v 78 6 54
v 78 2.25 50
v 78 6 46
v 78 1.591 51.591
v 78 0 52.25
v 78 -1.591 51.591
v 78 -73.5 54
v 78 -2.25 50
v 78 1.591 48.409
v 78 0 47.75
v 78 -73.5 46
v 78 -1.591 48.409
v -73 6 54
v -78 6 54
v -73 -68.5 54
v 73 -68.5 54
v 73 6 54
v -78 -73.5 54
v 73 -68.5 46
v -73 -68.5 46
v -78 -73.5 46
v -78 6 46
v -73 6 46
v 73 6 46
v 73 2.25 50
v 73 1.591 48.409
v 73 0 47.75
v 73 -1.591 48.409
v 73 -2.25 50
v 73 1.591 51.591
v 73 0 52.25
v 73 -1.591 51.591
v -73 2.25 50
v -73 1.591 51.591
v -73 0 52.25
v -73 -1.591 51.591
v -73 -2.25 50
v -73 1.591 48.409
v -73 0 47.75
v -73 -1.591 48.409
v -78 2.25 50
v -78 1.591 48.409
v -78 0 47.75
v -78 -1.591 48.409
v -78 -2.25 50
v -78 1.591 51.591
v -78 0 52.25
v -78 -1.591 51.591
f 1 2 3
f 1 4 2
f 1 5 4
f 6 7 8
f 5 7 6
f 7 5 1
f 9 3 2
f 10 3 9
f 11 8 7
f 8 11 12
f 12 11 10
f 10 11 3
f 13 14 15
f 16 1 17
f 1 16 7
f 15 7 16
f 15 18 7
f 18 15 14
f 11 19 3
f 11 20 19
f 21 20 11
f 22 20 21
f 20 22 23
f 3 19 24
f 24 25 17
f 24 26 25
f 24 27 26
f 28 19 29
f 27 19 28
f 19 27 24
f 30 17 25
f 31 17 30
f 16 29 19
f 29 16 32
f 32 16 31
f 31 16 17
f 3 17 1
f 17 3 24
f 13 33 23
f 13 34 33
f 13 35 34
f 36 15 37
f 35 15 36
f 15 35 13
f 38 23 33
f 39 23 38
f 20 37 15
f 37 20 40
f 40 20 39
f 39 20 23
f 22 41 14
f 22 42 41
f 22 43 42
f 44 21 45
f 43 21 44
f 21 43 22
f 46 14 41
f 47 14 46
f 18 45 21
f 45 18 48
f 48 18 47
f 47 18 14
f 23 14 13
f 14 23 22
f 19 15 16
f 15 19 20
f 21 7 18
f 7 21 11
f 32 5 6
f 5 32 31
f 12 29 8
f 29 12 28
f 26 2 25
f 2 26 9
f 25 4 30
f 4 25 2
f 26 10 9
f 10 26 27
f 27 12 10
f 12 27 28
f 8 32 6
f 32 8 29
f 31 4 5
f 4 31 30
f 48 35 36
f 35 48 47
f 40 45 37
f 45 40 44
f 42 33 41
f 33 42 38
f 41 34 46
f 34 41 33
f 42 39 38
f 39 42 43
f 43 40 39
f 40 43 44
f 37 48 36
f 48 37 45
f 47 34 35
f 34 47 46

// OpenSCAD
// file: faceplate.scad
// Removable Faceplate for 120mm Noctua Fan Housing
// Secured with 4x M2 screws + M2 nuts (nuts sit in hex pockets in the housing)
// Units: mm
// Matches fan_housing.scad

/* [Parameters – keep in sync with housing] */
outer_width = 140;          // MUST match fan_housing.scad
faceplate_thickness = 2.8;
fan_size = 120;
grille_margin = 8;              // how much solid border around the grille
faceplate_screw_offset = 66;    // MUST match housing (cardinal points now)
m2_clearance_d = 2.2;           // clearance hole for M2 screw
use_countersink = true;
countersink_d = 4.2;
countersink_depth = 1.2;

$fn = 64;

module faceplate() {
    difference() {
        // Outer plate – slightly smaller than housing for flush look, or match for flush
        hull() {
            for (x = [-1,1])
                for (y = [-1,1])
                    translate([x*(outer_width/2 - 4), y*(outer_width/2 - 4), 0])
                        cylinder(d=8, h=faceplate_thickness);
        }
        
        // Main airflow opening (slightly smaller than fan for safety)
        translate([0,0,-1])
            cylinder(d=fan_size - 6, h=faceplate_thickness + 2);
        
        // Protective but high-airflow grille: outer ring + 3 concentric rings + 6 spokes
        // Outer safety ring
        difference() {
            cylinder(d=fan_size - 4, h=faceplate_thickness + 1);
            cylinder(d=fan_size - 10, h=faceplate_thickness + 2);
        }
        // Inner rings
        for (r = [22, 38, 52]) {
            difference() {
                cylinder(d=r*2 + 2.5, h=faceplate_thickness + 1);
                cylinder(d=r*2 - 2.5, h=faceplate_thickness + 2);
            }
        }
        // Spokes
        for (a = [0 : 30 : 150]) {
            rotate([0,0,a])
                translate([0, 0, faceplate_thickness/2])
                    cube([fan_size - 12, 1.8, faceplate_thickness + 1], center=true);
        }
        
        // M2 clearance holes (cardinal points - must match housing)
        for (a = [0, 90, 180, 270]) {
            rotate([0,0,a])
                translate([faceplate_screw_offset, 0, -0.1]) {
                    cylinder(d=m2_clearance_d, h=faceplate_thickness + 1);
                    if (use_countersink)
                        translate([0,0,faceplate_thickness - countersink_depth])
                            cylinder(d1=m2_clearance_d, d2=countersink_d, h=countersink_depth + 0.1);
                }
        }
    }
}

faceplate();
// file: bail.scad
// U-Bail Bracket for the table fan - side-pivot hanging/prop stand.
// Prints flat on the bed (X-Y plane), no supports. Drill the 4.5mm pivot
// holes after printing if they don't come out clean.
//
// Assembly: M4 screw through each arm into the heat-set insert in the
// housing's pivot pad. Friction pivot - tighten to taste (truck vibration).
//   - Folded: arms point down, bar nests in the groove under the base.
//   - Prop: insert an M3 screw (from your kit) in each stop-pin hole, swing
//     the bail back until the arms rest on the pins (~30 deg).
//   - Hang: pull the stop pins, swing the bail up ~100 deg, hook the bar
//     over a wall hook. The fan dangles below on the two M4 pivots.
//
// Arm centers at X=±75.5 (ride on the 3mm pivot pads); pivot holes at local
// Y=0 align with the housing pivots at (Y=0, Z=50).

bail_arm_x = 75.5;   // arm centerline |X|
bail_arm_t = 5;      // arm thickness (X)
bail_arm_w = 8;      // arm width (Z)
bail_arm_l = 71;     // pivot center to bar center
bail_bar_y = -73.5;  // bar bottom edge (nests in base groove)
bail_z0 = 46;        // arm/bar front face (Z)

module bail() {
    difference() {
        union() {
            // arms (pivot hole 6mm below the top end)
            for (sx = [1, -1])
                translate([sx*bail_arm_x - bail_arm_t/2, -bail_arm_l, bail_z0])
                    cube([bail_arm_t, bail_arm_l + 6, bail_arm_w]);
            // bottom bar joining the arms
            translate([-bail_arm_x - bail_arm_t/2, bail_bar_y, bail_z0])
                cube([2*bail_arm_x + bail_arm_t, 5, bail_arm_w]);
        }
        // pivot holes (M4 clearance)
        for (sx = [1, -1])
            translate([sx*bail_arm_x - 3, 0, 50])
                rotate([0,90,0]) cylinder(d=4.5, h=6);
    }
}

// ---------- Render ----------
bail();
// main file
// Geometry checks, run by tools/check_geometry.py. Each `check` value
// renders one solid; the script exports it and measures its volume.
//   clear  : must be empty (an interference, or an opening that is blocked)
//   touch  : must NOT be empty (a contact that has to exist)
//   inside : must be empty (material that should surround a hole is missing)
// The script also renders every printable part to confirm it is manifold.

include <bail.scad>
bail_part = "none";
use <faceplate.scad>

check = "";

blade_d = 116;                  // the fan's blade disc

module front_faceplate() { mirror([0, 0, 1]) faceplate(); }

// Everything the bail must clear while it swings.
module bail_obstacles() {
    head();
    rounded_box_z(outer_width, outer_width, -2.8, 0, corner_r);                // the front faceplate
    rounded_box_y(outer_width, base_depth, base_bottom, head_y0, corner_r);    // base + plate
    oled_pod();
    zero_collar();
    translate([outer_width/2, pot_y, pot_z]) rotate([0, 90, 0]) cylinder(d=22, h=18);   // knob
}

module board_keepouts() {
    bms_keepout(); charger_keepout(); carrier_pcb_keepout();
    pot_keepout(); usb_socket_keepout(); button_keepout();
    rear_screws_keepout();
}

// Material that must surround each insert pilot (1.2-1.5 mm walls).
module head_pilot_rings() {
    // the bail's pivots, from the recess floor into the top columns
    for (sx = [-1, 1])
        translate([sx*(duct_x - 0.2), pivot_y, pivot_z]) rotate([0, -sx*90, 0])
            difference() { cylinder(d=m4_insert_d + 3, h=m4_insert_depth - 0.2); cylinder(d=m4_insert_d, h=20, center=true); }
    // the front faceplate's
    for (a = [0, 90, 180, 270])
        rotate([0, 0, a]) translate([faceplate_screw_offset, 0, 0.2])
            difference() { cylinder(d=m2_insert_d + 2.4, h=m2_insert_depth - 0.2); cylinder(d=m2_insert_d, h=20, center=true); }
    // the fan's, in the columns' front faces
    for (sx = [-1, 1], sy = [-1, 1])
        translate([sx*mount_spacing/2, sy*mount_spacing/2, fan_z0 + fan_thickness + 0.2])
            difference() { cylinder(d=m3_insert_d + 3, h=m3_insert_depth - 0.2); cylinder(d=m3_insert_d, h=20, center=true); }
    // the rear head-to-base screws', up into the bottom columns
    for (p = rear_join_pts)
        translate([p[0], 0, p[1]]) difference() { y_cyl(m3_insert_d + 3, head_y0 + 0.2, m3_insert_depth - 0.2); y_cyl(m3_insert_d, head_y0 - 1, 20); }
}
module base_pilot_rings() {
    for (sx = [-1, 1], fz = [0, 1]) {
        p = corner_boss_xz(sx, fz);
        translate([p[0], 0, p[1]]) difference() { y_cyl(m3_insert_d + 3, base_floor + 0.2, m3_insert_depth); y_cyl(m3_insert_d, base_floor - 1, 20); }
    }
    for (p = join_pts)
        translate([p[0], 0, p[1]]) difference() { y_cyl(m3_insert_d + 3, head_y0 - m3_insert_depth, m3_insert_depth - 0.2); y_cyl(m3_insert_d, head_y0 - 20, 30); }
    // the wall + boss under the pot nut (3 mm), across the M7 nut and washer's 14 mm
    translate([in_x - pot_boss_t + 0.1, pot_y, pot_z]) rotate([0, 90, 0])
        difference() { cylinder(d=14, h=pot_boss_t + base_wall - knob_recess_depth - 0.2); cylinder(d=pot_hole_d, h=20, center=true); }
}

if (check == "fan_vs_head") {                   // review: the mezzanine and the dial cut into the fan
    intersection() { fan_keepout(); head(); }
} else if (check == "fan_on_ledges") {          // touch: the fan's rear corners bear on the columns
    intersection() { translate([0, 0, 0.2]) fan_keepout(); head(); }
} else if (check == "airflow") {                // review: a 16 mm slab behind the fan blocked 68% of the blades
    intersection() {
        union() {
            translate([0, 0, fan_z0 + fan_thickness])
                cylinder(d=blade_d, h=head_depth - rear_grille_t - fan_z0 - fan_thickness);
            translate([0, 0, head_depth]) cylinder(d=blade_d, h=6);         // just behind the rear grille
        }
        union() { head(); base(); oled_pod(); bail_at(0); bail_at(bail_fold); }
    }
} else if (check == "cells_vs_sled") {          // review: 65 mm cells in a 24 mm sled
    intersection() { cells_keepout(); sled_placed(); }
} else if (check == "sled_vs_body") {           // review: the sled poked out of the base and into the fan
    intersection() { sled_placed(); union() { base(); bottom_plate(); head(); } }
} else if (check == "boards_vs_body") {
    intersection() { board_keepouts(); union() { base(); bottom_plate(); head(); } }
} else if (check == "boards_vs_each_other") {   // includes the pot against the fan, cells and sled
    ko = ["bms", "charger", "pcb", "pot", "usb", "button", "sled", "fan", "rear_screws"];
    for (i = [0 : len(ko) - 2], j = [i + 1 : len(ko) - 1])
        intersection() { keepout(ko[i]); keepout(ko[j]); }
} else if (check == "pcb_on_bosses") {         // touch: the carrier board bears on the plate's bosses
    intersection() { translate([0, -0.2, 0]) carrier_pcb_board(); bottom_plate(); }
} else if (check == "pcb_bosses_whole") {      // review: a vent slot could cut a boss and pass the touch check
    // every boss, its pilot aside, is solid plate: nothing of it is missing
    difference() {
        for (h = carrier_pcb_holes) translate([h[0], 0, h[1]]) difference() {
            y_cyl(carrier_boss_d - 0.1, base_floor, carrier_boss_h - 0.05);
            y_cyl(1.8, base_floor - 1, carrier_boss_h + 2);
        }
        bottom_plate();
    }
} else if (check == "openings") {               // review: the USB-C and button holes were blind
    intersection() { openings_keepout(); union() { head(); base(); bottom_plate(); oled_pod(); } }
} else if (check == "bail_sweep") {             // review: the bail collided at every angle
    // loosened (its teeth lifted clear of the wall's), from up to folded
    for (a = [0 : 3 : bail_fold]) intersection() { bail_at(a, tooth_h + 0.3); bail_obstacles(); }
} else if (check == "bail_detents") {           // at each 15 deg step the teeth mesh without colliding
    for (a = [0 : 360/tooth_n : bail_fold]) intersection() { bail_at(a); head(); }
} else if (check == "bail_teeth_engage") {      // touch: clamped, the arms' teeth bear on the wall's
    intersection() { bail_teeth_at(0, -0.3); side_teeth(); }
} else if (check == "bail_folds_flush") {       // folded, nothing of the bail stands out past the sides
    intersection() {
        bail_at(bail_fold);
        both_sides() translate([outer_width/2 + 0.01, -200, -200]) cube([50, 400, 400]);
    }
} else if (check == "hook_clearance") {         // up, the bar stands at least bail_hook_min over the head
    intersection() {
        bail_at(0);
        translate([-arm_x0 + 1, outer_width/2, pivot_z - bail_w/2 - 1]) cube([2*arm_x0 - 2, bail_hook_min, bail_w + 2]);
    }
} else if (check == "parts_mate") {
    intersection() { head(); base(); }
    intersection() { head(); bottom_plate(); }
    intersection() { base(); bottom_plate(); }
    intersection() { base(); oled_pod(); }
    intersection() { head(); oled_pod(); }
    intersection() { head(); front_faceplate(); }
    intersection() { head(); bail_at(0); }
} else if (check == "fan_bolts") {              // review: the top fan screws could not clamp
    intersection() { fan_bolts_keepout(); head(); }
} else if (check == "oled_fit") {               // review: the pod's posts left no room for the PCB
    intersection() { oled_keepout(); oled_pod(); }
} else if (check == "oled_on_posts") {          // touch: the PCB seats on the posts
    intersection() { translate([0, 0, 0.2]) oled_pcb_keepout(); oled_pod(); }
} else if (check == "button_floor") {          // touch: a press on the button bears on a floor, not glue
    intersection() { translate([-0.2, 0, 0]) button_body_keepout(); base(); }
} else if (check == "head_pilots") {            // inside: walls round the head's insert pilots
    difference() { head_pilot_rings(); head(); }
} else if (check == "base_pilots") {            // inside: walls round the base's pilots; the knob recess is on the outer face
    difference() { base_pilot_rings(); base(); }
}

module keepout(name) {
    if (name == "bms") bms_keepout();
    else if (name == "charger") charger_keepout();
    else if (name == "pcb") carrier_pcb_keepout();
    else if (name == "pot") pot_keepout();
    else if (name == "usb") usb_socket_keepout();
    else if (name == "button") button_keepout();
    else if (name == "sled") { sled_placed(); cells_keepout(); }
    else if (name == "fan") fan_keepout();
    else if (name == "rear_screws") rear_screws_keepout();
}
